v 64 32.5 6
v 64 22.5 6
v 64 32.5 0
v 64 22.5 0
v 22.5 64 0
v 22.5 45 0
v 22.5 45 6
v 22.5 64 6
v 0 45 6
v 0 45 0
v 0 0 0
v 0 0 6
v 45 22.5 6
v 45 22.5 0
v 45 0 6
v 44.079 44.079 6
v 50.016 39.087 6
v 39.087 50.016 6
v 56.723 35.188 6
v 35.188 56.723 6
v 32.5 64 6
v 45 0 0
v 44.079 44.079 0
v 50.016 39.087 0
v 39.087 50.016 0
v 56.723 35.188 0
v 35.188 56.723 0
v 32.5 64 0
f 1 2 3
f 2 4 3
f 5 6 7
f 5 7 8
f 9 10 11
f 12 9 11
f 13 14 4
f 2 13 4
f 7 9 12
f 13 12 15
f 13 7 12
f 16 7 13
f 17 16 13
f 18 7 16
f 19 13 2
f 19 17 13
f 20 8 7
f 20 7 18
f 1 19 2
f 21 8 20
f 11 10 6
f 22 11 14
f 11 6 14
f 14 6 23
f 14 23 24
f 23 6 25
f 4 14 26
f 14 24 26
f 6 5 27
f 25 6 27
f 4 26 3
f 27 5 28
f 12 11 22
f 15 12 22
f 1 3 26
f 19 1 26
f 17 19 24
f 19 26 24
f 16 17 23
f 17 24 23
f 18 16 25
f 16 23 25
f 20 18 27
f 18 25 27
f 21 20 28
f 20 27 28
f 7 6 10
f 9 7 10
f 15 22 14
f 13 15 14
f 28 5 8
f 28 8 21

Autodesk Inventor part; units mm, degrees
ref_plane "YZ Plane" through (0, 0, 0) normal (1, 0, 0) x (0, 1, 0)
ref_plane "XZ Plane" through (0, 0, 0) normal (0, 1, 0) x (-1, 0, 0)
ref_plane "XY Plane" through (0, 0, 0) normal (0, 0, 1) x (1, 0, 0)
sketch "Szkic1" plane through (0, 0, 0) normal (0, 0, 1) x (1, 0, 0)
  line L0 (0, 0) -> (45, 0) construction
  line L1 (45, 0) -> (45, 45) construction
  line L2 (45, 45) -> (0, 45) construction
  line L3 (0, 45) -> (0, 0) construction
  line L4 (0, 45) -> (22.5, 45) construction
  line L5 (45, 0) -> (45, 22.5) construction
  line L6 (22.5, 45) -> (0, 45)
  line L7 (0, 45) -> (0, 0)
  line L8 (0, 0) -> (45, 0)
  line L9 (45, 0) -> (45, 22.5)
  line L10 (22.5, 45) -> (22.5, 64)
  line L11 (45, 22.5) -> (64, 22.5)
  line L12 (22.5, 64) -> (32.5, 64)
  line L13 (64, 22.5) -> (64, 32.5)
  arc A0 (32.5, 64) -> (64, 32.5) centre (75.8985, 75.8985) ccw
  dimension "d0" = 45
  dimension "d1" = 45
  dimension "d2" = 22.5
  dimension "d3" = 19
  dimension "d4" = 19
  dimension "d5" = 10
  dimension "d6" = 10
  dimension "d7" = 45
extrude "Wyciągnięcie proste1" add sketch "Szkic1" along normal blind 6
equation "\"d0\" = d1"
equation "\"d3\" = d4"
equation "\"d5\" = d6"
properties part number "zamek_II_boki"
